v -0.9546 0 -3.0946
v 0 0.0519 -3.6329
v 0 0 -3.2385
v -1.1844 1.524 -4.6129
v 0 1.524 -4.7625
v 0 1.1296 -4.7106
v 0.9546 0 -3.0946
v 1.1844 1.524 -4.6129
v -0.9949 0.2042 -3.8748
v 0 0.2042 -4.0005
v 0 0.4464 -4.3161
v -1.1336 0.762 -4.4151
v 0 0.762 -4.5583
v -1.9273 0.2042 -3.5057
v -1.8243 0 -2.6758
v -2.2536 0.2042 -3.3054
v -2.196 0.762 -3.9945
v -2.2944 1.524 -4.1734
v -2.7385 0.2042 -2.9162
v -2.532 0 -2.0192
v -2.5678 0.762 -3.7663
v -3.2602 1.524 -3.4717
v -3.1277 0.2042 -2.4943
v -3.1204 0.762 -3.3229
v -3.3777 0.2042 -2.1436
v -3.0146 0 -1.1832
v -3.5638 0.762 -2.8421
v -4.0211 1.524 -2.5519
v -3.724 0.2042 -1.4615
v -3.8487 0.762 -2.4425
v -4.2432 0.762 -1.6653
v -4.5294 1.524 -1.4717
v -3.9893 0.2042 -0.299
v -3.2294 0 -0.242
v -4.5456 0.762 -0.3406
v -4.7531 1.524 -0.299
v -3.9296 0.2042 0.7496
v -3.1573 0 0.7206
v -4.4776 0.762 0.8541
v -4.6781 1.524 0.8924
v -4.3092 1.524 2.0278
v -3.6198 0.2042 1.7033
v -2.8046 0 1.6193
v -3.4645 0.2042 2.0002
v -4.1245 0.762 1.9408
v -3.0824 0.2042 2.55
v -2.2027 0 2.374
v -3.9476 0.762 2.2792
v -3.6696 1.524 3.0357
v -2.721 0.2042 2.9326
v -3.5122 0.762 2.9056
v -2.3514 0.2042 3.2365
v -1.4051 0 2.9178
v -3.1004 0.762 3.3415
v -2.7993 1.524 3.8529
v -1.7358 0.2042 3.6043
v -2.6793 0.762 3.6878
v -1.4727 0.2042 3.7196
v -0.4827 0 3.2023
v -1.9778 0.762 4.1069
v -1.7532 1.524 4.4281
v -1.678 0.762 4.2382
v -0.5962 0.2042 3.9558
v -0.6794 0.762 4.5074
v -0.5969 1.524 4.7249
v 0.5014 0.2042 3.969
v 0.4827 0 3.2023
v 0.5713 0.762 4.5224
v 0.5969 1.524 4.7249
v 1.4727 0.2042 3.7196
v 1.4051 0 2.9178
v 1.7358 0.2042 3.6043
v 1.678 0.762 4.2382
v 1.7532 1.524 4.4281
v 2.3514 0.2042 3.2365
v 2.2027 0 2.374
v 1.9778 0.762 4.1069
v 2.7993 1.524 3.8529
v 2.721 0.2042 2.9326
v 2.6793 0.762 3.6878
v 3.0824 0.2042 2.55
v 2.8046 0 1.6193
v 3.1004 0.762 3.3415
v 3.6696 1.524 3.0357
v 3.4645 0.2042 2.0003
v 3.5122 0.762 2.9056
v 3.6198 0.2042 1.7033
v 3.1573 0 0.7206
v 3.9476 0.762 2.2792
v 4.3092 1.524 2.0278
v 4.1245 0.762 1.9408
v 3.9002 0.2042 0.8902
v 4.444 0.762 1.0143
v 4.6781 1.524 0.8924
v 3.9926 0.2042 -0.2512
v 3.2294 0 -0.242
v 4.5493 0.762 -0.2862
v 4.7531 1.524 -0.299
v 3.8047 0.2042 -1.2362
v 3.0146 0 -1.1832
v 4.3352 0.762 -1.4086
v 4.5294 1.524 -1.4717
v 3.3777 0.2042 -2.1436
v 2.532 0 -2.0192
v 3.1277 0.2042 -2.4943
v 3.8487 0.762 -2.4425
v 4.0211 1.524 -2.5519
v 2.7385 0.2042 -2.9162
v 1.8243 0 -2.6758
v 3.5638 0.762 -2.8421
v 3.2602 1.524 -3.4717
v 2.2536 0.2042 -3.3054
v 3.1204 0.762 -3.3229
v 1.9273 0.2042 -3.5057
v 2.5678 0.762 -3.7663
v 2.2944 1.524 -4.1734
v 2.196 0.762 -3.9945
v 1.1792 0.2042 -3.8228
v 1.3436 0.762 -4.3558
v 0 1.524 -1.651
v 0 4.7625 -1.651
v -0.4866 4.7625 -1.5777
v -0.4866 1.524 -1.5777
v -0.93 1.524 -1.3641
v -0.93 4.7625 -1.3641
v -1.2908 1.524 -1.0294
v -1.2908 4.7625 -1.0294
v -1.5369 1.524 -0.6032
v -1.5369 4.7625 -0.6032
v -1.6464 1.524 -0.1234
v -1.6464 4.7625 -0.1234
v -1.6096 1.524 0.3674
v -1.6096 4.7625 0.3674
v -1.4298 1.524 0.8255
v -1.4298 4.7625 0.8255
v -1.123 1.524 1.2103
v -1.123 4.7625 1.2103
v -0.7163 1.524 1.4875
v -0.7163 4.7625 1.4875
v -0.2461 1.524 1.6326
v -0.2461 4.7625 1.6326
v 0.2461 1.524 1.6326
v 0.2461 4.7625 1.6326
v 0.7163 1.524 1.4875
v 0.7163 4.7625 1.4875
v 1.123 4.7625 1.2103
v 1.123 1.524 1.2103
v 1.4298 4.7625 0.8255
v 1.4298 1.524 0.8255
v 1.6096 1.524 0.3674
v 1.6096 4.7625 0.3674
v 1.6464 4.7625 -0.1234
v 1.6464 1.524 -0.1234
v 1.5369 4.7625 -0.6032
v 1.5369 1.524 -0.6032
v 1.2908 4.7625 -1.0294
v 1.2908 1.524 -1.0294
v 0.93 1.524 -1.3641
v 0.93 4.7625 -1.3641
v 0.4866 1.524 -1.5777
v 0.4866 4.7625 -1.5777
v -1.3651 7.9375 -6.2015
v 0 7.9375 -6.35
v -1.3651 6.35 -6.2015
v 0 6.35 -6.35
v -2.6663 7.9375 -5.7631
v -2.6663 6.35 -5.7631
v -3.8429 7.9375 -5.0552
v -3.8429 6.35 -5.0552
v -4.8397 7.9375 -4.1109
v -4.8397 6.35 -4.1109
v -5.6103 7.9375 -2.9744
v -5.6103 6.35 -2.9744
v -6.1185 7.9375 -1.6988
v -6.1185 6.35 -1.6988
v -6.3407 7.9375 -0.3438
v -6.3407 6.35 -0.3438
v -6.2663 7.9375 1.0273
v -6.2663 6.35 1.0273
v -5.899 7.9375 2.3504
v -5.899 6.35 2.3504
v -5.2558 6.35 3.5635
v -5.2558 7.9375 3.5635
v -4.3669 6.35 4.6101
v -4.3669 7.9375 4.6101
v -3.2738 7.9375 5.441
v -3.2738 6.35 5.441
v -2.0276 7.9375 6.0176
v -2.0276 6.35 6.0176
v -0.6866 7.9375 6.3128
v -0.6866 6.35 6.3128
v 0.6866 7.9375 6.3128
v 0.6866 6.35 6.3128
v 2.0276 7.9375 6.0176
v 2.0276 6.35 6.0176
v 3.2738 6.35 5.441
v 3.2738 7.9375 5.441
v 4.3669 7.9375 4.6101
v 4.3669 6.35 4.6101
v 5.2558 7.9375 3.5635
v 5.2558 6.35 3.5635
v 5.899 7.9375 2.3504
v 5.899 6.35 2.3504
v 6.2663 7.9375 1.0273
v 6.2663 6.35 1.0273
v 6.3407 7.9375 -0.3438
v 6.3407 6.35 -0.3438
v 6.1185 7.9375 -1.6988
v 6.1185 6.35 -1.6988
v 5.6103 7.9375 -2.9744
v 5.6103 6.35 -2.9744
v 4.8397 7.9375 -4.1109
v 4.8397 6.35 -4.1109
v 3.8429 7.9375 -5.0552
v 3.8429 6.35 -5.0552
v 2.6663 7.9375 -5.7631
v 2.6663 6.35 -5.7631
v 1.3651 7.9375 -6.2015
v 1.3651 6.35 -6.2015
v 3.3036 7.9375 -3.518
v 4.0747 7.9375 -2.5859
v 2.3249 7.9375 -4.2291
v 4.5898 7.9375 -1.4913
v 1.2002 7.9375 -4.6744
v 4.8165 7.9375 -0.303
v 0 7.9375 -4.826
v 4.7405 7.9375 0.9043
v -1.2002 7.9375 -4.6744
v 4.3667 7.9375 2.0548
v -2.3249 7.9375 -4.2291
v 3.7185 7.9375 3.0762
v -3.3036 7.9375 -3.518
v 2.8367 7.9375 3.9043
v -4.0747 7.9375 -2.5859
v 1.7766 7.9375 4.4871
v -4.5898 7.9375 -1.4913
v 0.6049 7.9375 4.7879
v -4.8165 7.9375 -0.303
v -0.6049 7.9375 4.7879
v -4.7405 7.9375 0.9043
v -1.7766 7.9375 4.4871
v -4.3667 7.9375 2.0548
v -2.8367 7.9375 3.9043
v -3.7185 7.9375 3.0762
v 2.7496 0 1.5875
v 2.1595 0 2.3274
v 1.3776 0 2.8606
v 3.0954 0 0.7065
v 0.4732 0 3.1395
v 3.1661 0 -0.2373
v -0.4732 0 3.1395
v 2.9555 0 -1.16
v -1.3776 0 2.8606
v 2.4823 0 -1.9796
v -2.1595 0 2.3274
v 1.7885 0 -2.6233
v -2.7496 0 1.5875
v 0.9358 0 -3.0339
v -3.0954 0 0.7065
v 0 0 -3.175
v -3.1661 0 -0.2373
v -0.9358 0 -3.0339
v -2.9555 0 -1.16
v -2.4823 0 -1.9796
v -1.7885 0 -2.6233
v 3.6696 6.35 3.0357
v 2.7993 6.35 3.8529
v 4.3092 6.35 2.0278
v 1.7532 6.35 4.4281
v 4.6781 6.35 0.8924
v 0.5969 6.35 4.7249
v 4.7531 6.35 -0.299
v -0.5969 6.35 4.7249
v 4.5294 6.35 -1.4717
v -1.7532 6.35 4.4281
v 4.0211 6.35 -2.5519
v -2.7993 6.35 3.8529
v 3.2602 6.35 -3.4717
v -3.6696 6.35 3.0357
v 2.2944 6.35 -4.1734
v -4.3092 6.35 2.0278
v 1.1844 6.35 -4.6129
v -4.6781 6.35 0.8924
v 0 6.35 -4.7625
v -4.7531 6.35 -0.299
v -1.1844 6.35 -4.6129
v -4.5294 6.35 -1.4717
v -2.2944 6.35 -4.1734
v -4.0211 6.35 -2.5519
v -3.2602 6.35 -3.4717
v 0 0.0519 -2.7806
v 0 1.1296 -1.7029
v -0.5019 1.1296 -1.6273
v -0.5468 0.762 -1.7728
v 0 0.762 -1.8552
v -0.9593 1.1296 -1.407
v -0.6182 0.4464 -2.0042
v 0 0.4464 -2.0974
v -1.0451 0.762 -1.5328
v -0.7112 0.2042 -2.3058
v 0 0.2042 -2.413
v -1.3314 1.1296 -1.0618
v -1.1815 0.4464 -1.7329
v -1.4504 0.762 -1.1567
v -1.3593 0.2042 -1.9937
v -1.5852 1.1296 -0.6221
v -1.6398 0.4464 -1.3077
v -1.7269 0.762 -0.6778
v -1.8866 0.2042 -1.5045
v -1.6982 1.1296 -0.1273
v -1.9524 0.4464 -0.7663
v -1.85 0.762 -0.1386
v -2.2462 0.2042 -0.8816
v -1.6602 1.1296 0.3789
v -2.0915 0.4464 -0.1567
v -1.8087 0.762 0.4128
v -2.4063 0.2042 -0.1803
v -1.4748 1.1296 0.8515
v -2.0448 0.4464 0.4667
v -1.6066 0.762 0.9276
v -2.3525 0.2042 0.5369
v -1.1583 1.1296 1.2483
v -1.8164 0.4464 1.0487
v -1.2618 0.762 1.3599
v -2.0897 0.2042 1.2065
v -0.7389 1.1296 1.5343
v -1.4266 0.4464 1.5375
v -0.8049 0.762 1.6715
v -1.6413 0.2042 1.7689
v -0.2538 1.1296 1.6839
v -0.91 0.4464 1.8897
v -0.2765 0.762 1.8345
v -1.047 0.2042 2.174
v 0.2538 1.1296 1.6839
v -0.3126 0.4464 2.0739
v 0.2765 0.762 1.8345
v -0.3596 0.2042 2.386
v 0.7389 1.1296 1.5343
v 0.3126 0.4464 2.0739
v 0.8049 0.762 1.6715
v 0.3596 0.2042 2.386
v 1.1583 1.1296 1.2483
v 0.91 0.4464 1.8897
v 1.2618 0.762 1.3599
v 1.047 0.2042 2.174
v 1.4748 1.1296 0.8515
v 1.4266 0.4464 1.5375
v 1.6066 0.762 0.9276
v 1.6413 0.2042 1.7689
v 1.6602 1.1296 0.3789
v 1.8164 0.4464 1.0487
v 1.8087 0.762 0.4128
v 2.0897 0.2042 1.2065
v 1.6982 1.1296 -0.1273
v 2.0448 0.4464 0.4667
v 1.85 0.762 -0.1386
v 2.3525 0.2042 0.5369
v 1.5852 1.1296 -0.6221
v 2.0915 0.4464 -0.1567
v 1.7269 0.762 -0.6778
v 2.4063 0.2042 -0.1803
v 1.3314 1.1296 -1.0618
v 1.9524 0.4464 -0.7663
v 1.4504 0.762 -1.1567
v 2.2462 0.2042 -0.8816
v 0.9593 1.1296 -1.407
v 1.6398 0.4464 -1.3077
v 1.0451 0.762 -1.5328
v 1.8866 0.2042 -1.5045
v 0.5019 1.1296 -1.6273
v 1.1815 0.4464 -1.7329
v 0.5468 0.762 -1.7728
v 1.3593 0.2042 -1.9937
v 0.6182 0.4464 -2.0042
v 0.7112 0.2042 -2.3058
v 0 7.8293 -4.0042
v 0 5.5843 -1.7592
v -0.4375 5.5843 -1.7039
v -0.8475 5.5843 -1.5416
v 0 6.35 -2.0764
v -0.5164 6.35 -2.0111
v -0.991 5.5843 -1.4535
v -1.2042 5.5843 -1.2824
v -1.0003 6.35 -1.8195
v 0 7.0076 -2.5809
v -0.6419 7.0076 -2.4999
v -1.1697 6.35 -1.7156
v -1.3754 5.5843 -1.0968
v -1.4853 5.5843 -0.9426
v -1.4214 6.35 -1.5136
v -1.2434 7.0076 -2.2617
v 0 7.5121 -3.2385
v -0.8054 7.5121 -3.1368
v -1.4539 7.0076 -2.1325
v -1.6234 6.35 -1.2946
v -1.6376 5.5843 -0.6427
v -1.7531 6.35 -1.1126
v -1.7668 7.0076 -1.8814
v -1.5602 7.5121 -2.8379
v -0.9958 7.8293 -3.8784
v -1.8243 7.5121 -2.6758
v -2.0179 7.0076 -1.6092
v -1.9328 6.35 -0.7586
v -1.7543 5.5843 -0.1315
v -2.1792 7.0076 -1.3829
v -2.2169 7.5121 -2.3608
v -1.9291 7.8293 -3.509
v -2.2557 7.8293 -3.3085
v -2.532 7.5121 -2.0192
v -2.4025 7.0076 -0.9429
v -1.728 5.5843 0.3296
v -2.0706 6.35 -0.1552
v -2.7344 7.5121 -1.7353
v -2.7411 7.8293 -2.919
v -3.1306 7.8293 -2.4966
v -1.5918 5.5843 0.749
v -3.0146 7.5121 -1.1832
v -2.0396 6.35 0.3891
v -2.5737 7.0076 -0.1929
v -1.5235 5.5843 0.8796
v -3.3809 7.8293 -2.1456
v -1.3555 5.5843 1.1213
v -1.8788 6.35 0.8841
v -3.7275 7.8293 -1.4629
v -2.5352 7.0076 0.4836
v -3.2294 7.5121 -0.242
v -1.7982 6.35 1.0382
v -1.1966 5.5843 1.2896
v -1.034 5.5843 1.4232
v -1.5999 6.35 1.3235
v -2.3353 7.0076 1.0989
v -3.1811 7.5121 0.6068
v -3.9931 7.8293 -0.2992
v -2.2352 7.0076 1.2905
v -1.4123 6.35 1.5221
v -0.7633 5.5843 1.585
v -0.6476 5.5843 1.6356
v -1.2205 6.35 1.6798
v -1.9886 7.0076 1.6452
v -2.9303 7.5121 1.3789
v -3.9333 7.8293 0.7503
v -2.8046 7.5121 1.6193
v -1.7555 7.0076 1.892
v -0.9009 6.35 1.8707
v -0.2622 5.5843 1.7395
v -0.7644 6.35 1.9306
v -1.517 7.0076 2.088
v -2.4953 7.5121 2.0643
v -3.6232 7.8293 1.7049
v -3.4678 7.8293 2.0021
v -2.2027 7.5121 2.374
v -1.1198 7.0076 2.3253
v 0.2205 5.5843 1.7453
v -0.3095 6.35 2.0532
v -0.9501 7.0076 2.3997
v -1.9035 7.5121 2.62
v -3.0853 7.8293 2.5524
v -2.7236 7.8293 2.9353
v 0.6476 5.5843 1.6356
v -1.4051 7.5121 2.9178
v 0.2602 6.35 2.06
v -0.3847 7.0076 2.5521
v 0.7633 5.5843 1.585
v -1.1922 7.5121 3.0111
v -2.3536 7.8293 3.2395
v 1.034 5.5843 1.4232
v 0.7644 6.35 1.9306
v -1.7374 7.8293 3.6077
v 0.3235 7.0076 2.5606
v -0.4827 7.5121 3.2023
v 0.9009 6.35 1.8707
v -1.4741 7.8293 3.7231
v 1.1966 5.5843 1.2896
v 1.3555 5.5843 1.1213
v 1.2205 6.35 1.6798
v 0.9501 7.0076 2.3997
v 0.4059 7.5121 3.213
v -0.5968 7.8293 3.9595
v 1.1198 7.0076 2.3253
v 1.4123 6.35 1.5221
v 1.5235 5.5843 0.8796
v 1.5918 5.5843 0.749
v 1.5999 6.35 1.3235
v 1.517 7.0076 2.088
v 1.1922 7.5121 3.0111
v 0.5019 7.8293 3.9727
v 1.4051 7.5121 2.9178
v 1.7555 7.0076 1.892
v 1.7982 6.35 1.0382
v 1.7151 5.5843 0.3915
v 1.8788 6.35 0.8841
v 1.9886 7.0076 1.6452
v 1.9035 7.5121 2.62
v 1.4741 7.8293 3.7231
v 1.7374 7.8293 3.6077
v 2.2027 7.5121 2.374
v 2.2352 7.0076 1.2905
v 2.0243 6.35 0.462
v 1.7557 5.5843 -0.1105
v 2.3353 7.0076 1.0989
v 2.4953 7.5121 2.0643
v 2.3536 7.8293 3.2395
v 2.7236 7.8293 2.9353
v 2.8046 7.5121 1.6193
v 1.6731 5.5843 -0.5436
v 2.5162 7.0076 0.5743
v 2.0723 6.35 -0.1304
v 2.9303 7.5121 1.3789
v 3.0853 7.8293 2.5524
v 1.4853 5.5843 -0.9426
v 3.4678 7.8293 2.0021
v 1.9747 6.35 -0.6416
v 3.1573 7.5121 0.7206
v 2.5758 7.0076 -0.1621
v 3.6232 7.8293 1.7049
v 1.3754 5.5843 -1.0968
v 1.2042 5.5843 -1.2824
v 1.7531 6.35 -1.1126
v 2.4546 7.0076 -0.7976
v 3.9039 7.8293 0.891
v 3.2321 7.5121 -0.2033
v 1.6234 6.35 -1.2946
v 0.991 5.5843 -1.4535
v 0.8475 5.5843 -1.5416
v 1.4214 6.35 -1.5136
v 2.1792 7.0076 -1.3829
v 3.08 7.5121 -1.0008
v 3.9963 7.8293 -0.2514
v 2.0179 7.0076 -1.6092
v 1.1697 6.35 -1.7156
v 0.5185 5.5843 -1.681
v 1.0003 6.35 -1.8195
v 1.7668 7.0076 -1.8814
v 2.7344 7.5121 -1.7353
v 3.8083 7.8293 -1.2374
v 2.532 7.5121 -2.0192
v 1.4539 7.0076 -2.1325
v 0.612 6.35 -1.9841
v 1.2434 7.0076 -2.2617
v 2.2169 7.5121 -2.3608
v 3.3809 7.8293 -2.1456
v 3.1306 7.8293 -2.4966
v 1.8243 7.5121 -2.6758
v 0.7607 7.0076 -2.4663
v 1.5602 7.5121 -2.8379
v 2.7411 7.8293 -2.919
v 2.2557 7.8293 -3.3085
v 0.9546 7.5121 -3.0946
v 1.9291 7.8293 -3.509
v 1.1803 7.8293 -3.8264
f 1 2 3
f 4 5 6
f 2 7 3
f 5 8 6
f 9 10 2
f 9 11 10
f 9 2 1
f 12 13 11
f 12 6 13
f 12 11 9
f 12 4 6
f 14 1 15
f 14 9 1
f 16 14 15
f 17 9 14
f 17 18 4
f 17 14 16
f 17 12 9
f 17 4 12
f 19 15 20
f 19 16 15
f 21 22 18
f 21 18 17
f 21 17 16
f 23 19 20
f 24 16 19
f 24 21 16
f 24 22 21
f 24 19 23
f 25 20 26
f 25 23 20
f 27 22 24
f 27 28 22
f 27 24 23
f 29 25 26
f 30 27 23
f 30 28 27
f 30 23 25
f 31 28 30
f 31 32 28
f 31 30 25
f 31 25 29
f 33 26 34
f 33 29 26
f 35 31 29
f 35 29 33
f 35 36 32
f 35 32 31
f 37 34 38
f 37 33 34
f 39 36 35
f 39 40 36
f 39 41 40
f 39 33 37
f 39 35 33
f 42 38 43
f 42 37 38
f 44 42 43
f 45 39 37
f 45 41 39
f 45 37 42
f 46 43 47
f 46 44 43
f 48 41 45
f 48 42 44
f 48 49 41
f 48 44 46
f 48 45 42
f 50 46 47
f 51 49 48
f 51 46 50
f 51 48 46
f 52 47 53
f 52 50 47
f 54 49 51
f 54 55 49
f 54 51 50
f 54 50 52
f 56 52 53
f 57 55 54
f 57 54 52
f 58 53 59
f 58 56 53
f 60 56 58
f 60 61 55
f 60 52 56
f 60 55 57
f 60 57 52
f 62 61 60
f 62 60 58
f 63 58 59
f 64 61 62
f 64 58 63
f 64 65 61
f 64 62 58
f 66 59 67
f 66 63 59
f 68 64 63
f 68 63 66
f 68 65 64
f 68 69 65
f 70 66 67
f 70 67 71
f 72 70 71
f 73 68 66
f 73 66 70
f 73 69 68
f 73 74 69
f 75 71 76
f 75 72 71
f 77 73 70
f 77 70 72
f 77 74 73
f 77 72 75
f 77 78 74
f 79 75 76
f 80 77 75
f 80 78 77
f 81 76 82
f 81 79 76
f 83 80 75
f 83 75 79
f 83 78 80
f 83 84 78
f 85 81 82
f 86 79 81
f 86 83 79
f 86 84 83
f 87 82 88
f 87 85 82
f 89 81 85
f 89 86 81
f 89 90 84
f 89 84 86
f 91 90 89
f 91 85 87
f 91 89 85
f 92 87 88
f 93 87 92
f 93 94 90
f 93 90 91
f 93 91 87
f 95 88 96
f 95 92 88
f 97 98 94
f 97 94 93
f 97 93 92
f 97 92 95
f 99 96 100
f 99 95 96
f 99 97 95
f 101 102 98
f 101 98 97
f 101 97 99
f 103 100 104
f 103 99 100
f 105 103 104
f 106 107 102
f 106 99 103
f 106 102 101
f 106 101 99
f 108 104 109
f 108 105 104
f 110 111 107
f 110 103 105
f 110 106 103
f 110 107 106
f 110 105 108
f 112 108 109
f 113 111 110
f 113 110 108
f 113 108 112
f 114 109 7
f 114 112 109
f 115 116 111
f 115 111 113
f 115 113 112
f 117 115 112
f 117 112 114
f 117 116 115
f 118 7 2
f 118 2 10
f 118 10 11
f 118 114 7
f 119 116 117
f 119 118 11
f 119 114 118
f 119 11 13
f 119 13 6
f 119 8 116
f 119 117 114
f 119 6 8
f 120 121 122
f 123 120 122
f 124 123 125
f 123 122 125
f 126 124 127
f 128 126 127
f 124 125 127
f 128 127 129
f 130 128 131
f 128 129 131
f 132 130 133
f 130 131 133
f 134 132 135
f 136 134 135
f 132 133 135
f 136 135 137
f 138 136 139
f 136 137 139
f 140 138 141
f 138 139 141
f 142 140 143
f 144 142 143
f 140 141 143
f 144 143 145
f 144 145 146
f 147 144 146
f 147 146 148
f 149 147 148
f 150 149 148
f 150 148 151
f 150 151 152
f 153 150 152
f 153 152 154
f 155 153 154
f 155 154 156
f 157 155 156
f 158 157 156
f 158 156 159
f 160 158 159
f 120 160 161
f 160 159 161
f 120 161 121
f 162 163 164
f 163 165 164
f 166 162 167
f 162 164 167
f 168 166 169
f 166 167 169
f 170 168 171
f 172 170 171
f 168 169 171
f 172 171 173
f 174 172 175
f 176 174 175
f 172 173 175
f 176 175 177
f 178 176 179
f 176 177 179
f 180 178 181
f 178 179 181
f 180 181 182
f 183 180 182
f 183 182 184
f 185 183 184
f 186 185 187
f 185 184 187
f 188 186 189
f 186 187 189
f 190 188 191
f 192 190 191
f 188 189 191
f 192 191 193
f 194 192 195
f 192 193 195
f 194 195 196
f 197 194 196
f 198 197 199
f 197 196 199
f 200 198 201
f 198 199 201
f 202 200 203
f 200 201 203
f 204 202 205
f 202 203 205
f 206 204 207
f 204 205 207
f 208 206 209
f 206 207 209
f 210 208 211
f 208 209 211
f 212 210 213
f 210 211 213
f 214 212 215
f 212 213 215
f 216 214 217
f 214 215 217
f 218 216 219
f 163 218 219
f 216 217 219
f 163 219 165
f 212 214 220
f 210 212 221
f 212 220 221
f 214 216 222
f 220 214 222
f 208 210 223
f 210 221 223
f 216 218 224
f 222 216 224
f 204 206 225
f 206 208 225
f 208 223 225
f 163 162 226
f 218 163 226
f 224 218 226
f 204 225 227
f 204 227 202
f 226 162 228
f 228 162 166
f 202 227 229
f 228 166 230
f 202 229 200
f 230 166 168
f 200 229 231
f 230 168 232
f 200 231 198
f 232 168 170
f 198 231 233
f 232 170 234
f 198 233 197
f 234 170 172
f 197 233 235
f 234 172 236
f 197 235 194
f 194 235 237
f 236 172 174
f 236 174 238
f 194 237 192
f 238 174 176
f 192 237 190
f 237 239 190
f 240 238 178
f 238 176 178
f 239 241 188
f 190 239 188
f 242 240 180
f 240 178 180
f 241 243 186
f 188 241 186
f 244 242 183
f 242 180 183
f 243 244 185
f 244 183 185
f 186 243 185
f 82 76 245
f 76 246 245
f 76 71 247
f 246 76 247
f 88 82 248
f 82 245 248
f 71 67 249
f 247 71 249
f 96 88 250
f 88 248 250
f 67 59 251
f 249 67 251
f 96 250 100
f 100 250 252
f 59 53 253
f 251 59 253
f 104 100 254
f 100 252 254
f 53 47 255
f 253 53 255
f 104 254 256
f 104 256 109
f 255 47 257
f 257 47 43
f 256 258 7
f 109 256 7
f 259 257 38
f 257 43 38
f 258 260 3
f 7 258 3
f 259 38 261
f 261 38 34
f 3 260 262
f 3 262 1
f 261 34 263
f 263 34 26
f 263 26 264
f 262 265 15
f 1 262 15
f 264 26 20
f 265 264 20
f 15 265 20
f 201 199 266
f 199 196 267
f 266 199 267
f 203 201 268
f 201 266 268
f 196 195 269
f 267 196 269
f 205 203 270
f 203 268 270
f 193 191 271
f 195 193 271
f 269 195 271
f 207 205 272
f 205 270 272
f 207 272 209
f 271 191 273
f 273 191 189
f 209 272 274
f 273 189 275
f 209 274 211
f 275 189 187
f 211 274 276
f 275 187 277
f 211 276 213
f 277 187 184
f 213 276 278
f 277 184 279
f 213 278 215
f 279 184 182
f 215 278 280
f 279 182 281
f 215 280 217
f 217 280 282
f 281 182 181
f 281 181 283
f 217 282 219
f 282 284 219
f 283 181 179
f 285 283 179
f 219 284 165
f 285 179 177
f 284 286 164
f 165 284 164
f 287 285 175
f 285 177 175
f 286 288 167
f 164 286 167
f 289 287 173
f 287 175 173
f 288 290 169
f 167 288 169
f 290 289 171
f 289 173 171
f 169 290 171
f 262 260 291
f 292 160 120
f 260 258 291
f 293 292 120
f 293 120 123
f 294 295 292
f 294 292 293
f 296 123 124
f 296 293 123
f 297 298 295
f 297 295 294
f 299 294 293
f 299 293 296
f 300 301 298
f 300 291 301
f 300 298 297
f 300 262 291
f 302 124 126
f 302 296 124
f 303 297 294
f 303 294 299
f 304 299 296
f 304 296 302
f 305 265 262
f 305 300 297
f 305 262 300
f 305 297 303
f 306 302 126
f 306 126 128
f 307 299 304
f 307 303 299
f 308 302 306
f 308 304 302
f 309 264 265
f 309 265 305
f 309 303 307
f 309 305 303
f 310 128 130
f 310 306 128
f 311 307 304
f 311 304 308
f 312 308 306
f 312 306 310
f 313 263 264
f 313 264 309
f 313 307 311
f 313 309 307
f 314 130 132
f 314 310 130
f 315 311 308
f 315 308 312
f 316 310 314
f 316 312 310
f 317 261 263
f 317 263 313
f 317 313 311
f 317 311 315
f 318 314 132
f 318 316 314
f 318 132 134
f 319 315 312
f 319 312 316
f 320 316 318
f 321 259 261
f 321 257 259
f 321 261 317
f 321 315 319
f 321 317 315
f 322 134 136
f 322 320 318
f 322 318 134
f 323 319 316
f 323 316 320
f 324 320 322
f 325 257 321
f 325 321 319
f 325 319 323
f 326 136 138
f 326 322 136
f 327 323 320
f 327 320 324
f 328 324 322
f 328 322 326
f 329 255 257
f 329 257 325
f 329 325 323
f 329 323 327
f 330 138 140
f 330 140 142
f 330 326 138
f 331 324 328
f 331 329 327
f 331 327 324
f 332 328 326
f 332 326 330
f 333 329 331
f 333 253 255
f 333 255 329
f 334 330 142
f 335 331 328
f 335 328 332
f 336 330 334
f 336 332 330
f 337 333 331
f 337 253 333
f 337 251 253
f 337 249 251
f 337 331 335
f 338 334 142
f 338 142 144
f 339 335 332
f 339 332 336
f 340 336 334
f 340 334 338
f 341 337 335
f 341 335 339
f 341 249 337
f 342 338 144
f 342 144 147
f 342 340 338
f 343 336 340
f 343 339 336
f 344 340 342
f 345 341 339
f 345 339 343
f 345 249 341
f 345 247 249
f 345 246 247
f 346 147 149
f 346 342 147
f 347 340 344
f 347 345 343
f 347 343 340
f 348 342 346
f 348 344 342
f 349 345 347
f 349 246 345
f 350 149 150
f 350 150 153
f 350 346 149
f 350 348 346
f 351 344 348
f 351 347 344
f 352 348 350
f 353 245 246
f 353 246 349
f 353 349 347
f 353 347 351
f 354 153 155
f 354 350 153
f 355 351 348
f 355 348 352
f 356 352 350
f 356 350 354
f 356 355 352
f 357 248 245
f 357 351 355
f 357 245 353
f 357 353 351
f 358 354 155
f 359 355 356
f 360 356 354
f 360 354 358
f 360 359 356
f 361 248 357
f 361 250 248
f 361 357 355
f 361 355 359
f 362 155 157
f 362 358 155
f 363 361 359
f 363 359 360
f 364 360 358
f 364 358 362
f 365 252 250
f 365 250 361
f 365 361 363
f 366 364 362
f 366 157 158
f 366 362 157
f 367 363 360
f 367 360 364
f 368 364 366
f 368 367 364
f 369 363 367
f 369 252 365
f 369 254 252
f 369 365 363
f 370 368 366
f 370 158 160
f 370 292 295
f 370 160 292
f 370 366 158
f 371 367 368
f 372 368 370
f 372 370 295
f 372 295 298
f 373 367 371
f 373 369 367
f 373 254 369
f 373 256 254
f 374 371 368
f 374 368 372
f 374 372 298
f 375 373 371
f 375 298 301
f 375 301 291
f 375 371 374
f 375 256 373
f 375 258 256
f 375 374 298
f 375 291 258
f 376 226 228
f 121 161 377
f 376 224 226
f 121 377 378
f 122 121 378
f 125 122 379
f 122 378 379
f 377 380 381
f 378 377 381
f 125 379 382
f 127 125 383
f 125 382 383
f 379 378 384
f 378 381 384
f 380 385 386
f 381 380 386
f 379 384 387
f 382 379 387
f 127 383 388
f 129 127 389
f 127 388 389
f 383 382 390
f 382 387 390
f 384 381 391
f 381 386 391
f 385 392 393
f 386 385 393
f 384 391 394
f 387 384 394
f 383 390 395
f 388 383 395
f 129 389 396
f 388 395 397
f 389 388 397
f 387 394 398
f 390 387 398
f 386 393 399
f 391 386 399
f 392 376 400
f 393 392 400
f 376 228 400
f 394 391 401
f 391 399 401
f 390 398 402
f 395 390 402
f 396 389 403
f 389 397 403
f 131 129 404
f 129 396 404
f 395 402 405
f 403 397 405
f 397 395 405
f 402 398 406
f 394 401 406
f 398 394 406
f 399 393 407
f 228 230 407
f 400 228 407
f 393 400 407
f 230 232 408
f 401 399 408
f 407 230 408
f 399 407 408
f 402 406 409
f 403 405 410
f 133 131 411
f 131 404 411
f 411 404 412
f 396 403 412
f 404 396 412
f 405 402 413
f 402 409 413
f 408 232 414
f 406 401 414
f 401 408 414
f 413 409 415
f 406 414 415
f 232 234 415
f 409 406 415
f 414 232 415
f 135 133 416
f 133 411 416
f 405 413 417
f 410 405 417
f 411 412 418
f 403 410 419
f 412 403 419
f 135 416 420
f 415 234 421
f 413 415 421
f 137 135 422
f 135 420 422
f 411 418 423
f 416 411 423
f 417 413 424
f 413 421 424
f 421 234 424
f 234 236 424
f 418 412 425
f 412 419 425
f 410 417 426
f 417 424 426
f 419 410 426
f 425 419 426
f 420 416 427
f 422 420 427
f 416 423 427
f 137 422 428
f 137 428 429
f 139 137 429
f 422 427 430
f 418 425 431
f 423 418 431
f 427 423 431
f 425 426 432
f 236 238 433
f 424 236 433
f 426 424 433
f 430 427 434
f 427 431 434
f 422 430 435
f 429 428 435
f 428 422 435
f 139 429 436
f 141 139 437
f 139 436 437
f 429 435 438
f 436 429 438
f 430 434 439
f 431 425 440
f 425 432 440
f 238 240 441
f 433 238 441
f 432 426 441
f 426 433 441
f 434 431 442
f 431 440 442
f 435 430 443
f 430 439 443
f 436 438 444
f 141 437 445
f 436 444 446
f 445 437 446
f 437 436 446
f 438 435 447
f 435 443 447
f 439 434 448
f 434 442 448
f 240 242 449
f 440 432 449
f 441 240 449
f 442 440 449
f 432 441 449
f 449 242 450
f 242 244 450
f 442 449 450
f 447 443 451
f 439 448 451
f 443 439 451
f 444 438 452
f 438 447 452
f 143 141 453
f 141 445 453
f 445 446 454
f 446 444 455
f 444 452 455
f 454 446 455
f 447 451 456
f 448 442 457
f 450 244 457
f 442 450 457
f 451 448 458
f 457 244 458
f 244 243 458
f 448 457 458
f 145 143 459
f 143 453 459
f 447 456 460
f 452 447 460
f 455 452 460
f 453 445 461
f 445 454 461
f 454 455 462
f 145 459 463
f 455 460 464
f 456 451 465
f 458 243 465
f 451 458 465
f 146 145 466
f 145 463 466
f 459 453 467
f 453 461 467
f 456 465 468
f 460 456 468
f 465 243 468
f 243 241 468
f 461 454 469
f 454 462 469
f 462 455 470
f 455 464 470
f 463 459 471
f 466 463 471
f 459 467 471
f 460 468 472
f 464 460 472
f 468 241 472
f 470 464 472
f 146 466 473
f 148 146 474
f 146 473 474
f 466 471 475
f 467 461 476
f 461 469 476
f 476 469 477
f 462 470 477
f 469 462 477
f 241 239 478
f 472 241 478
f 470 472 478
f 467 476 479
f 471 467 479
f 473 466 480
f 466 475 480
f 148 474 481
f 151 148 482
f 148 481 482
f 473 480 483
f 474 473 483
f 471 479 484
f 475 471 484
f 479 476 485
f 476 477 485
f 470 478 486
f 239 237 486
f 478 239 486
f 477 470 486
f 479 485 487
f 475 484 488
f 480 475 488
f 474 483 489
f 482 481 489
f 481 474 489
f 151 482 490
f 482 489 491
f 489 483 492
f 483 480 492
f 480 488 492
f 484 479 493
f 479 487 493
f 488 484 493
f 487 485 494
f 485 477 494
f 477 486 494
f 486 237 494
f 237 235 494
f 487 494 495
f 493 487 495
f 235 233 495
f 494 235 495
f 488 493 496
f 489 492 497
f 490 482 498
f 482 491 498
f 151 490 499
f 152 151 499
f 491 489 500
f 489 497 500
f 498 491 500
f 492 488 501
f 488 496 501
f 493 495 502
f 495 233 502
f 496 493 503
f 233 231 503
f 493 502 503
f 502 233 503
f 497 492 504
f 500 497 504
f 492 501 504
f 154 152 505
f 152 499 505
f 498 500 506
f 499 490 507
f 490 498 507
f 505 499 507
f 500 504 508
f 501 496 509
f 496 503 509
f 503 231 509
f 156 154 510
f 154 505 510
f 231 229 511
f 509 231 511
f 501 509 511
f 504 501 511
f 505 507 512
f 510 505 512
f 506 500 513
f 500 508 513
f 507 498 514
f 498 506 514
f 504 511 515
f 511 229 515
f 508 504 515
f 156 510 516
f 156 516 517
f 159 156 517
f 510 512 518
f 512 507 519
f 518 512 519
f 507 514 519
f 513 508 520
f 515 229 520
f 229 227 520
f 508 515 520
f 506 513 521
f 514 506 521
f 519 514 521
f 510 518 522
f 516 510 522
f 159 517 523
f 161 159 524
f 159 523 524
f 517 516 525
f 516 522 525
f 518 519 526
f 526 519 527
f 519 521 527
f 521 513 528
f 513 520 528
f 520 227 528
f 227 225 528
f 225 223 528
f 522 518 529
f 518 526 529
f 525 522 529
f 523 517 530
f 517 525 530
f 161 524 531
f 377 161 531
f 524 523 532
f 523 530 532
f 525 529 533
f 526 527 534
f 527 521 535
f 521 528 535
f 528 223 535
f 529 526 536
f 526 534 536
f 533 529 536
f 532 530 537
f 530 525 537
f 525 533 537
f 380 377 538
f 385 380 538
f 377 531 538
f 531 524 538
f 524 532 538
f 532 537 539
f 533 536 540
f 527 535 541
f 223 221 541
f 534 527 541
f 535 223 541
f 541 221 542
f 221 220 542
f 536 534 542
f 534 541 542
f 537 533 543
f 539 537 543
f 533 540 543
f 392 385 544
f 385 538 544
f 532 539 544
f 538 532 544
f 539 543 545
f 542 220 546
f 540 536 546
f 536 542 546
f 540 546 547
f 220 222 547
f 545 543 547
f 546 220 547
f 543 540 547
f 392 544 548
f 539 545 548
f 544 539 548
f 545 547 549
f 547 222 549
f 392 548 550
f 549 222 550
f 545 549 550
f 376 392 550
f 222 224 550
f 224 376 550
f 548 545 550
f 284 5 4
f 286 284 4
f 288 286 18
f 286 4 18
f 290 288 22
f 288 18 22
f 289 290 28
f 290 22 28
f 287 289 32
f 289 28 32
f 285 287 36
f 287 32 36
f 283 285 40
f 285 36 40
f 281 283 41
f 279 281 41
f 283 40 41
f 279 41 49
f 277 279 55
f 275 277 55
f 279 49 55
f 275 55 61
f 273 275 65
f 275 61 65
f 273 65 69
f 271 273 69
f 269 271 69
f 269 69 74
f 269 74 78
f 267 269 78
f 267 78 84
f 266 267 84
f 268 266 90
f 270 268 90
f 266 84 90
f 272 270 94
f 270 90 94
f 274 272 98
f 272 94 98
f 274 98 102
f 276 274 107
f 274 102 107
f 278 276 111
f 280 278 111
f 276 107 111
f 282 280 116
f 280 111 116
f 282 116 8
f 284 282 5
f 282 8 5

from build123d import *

# Parameters (mm, degrees)
FILLET1_R = 3.175
FILLET4_R = 1.524


with BuildPart() as part:
    # Sketch1 → Revolve1 (revolve)
    with BuildSketch(Plane(origin=(0, 0, 0), x_dir=(0, 0, -1), z_dir=(1, 0, 0)), mode=Mode.PRIVATE) as revolve1_sk:
        Polygon((-1.651, 0), (-1.651, 7.9375), (-6.35, 7.9375), (-6.35, 6.35), (-4.7625, 6.35), (-4.7625, 0), align=None)
    revolve(revolve1_sk.sketch.rotate(Axis((0, 0, 0), (0, 1, 0)), 180), axis=Axis((0, 0, 0), (0, 1, 0)))

    # Fillet1
    fillet1_edges = [part.edges().sort_by_distance(p)[0] for p in [
        (0, 7.9375, 1.651),
    ]]
    fillet(fillet1_edges, radius=FILLET1_R)

    # Fillet4
    fillet4_edges = [part.edges().sort_by_distance(p)[0] for p in [
        (0, 0, 4.7625),
        (0, 0, 1.651),
    ]]
    fillet(fillet4_edges, radius=FILLET4_R)


solid = part.part
